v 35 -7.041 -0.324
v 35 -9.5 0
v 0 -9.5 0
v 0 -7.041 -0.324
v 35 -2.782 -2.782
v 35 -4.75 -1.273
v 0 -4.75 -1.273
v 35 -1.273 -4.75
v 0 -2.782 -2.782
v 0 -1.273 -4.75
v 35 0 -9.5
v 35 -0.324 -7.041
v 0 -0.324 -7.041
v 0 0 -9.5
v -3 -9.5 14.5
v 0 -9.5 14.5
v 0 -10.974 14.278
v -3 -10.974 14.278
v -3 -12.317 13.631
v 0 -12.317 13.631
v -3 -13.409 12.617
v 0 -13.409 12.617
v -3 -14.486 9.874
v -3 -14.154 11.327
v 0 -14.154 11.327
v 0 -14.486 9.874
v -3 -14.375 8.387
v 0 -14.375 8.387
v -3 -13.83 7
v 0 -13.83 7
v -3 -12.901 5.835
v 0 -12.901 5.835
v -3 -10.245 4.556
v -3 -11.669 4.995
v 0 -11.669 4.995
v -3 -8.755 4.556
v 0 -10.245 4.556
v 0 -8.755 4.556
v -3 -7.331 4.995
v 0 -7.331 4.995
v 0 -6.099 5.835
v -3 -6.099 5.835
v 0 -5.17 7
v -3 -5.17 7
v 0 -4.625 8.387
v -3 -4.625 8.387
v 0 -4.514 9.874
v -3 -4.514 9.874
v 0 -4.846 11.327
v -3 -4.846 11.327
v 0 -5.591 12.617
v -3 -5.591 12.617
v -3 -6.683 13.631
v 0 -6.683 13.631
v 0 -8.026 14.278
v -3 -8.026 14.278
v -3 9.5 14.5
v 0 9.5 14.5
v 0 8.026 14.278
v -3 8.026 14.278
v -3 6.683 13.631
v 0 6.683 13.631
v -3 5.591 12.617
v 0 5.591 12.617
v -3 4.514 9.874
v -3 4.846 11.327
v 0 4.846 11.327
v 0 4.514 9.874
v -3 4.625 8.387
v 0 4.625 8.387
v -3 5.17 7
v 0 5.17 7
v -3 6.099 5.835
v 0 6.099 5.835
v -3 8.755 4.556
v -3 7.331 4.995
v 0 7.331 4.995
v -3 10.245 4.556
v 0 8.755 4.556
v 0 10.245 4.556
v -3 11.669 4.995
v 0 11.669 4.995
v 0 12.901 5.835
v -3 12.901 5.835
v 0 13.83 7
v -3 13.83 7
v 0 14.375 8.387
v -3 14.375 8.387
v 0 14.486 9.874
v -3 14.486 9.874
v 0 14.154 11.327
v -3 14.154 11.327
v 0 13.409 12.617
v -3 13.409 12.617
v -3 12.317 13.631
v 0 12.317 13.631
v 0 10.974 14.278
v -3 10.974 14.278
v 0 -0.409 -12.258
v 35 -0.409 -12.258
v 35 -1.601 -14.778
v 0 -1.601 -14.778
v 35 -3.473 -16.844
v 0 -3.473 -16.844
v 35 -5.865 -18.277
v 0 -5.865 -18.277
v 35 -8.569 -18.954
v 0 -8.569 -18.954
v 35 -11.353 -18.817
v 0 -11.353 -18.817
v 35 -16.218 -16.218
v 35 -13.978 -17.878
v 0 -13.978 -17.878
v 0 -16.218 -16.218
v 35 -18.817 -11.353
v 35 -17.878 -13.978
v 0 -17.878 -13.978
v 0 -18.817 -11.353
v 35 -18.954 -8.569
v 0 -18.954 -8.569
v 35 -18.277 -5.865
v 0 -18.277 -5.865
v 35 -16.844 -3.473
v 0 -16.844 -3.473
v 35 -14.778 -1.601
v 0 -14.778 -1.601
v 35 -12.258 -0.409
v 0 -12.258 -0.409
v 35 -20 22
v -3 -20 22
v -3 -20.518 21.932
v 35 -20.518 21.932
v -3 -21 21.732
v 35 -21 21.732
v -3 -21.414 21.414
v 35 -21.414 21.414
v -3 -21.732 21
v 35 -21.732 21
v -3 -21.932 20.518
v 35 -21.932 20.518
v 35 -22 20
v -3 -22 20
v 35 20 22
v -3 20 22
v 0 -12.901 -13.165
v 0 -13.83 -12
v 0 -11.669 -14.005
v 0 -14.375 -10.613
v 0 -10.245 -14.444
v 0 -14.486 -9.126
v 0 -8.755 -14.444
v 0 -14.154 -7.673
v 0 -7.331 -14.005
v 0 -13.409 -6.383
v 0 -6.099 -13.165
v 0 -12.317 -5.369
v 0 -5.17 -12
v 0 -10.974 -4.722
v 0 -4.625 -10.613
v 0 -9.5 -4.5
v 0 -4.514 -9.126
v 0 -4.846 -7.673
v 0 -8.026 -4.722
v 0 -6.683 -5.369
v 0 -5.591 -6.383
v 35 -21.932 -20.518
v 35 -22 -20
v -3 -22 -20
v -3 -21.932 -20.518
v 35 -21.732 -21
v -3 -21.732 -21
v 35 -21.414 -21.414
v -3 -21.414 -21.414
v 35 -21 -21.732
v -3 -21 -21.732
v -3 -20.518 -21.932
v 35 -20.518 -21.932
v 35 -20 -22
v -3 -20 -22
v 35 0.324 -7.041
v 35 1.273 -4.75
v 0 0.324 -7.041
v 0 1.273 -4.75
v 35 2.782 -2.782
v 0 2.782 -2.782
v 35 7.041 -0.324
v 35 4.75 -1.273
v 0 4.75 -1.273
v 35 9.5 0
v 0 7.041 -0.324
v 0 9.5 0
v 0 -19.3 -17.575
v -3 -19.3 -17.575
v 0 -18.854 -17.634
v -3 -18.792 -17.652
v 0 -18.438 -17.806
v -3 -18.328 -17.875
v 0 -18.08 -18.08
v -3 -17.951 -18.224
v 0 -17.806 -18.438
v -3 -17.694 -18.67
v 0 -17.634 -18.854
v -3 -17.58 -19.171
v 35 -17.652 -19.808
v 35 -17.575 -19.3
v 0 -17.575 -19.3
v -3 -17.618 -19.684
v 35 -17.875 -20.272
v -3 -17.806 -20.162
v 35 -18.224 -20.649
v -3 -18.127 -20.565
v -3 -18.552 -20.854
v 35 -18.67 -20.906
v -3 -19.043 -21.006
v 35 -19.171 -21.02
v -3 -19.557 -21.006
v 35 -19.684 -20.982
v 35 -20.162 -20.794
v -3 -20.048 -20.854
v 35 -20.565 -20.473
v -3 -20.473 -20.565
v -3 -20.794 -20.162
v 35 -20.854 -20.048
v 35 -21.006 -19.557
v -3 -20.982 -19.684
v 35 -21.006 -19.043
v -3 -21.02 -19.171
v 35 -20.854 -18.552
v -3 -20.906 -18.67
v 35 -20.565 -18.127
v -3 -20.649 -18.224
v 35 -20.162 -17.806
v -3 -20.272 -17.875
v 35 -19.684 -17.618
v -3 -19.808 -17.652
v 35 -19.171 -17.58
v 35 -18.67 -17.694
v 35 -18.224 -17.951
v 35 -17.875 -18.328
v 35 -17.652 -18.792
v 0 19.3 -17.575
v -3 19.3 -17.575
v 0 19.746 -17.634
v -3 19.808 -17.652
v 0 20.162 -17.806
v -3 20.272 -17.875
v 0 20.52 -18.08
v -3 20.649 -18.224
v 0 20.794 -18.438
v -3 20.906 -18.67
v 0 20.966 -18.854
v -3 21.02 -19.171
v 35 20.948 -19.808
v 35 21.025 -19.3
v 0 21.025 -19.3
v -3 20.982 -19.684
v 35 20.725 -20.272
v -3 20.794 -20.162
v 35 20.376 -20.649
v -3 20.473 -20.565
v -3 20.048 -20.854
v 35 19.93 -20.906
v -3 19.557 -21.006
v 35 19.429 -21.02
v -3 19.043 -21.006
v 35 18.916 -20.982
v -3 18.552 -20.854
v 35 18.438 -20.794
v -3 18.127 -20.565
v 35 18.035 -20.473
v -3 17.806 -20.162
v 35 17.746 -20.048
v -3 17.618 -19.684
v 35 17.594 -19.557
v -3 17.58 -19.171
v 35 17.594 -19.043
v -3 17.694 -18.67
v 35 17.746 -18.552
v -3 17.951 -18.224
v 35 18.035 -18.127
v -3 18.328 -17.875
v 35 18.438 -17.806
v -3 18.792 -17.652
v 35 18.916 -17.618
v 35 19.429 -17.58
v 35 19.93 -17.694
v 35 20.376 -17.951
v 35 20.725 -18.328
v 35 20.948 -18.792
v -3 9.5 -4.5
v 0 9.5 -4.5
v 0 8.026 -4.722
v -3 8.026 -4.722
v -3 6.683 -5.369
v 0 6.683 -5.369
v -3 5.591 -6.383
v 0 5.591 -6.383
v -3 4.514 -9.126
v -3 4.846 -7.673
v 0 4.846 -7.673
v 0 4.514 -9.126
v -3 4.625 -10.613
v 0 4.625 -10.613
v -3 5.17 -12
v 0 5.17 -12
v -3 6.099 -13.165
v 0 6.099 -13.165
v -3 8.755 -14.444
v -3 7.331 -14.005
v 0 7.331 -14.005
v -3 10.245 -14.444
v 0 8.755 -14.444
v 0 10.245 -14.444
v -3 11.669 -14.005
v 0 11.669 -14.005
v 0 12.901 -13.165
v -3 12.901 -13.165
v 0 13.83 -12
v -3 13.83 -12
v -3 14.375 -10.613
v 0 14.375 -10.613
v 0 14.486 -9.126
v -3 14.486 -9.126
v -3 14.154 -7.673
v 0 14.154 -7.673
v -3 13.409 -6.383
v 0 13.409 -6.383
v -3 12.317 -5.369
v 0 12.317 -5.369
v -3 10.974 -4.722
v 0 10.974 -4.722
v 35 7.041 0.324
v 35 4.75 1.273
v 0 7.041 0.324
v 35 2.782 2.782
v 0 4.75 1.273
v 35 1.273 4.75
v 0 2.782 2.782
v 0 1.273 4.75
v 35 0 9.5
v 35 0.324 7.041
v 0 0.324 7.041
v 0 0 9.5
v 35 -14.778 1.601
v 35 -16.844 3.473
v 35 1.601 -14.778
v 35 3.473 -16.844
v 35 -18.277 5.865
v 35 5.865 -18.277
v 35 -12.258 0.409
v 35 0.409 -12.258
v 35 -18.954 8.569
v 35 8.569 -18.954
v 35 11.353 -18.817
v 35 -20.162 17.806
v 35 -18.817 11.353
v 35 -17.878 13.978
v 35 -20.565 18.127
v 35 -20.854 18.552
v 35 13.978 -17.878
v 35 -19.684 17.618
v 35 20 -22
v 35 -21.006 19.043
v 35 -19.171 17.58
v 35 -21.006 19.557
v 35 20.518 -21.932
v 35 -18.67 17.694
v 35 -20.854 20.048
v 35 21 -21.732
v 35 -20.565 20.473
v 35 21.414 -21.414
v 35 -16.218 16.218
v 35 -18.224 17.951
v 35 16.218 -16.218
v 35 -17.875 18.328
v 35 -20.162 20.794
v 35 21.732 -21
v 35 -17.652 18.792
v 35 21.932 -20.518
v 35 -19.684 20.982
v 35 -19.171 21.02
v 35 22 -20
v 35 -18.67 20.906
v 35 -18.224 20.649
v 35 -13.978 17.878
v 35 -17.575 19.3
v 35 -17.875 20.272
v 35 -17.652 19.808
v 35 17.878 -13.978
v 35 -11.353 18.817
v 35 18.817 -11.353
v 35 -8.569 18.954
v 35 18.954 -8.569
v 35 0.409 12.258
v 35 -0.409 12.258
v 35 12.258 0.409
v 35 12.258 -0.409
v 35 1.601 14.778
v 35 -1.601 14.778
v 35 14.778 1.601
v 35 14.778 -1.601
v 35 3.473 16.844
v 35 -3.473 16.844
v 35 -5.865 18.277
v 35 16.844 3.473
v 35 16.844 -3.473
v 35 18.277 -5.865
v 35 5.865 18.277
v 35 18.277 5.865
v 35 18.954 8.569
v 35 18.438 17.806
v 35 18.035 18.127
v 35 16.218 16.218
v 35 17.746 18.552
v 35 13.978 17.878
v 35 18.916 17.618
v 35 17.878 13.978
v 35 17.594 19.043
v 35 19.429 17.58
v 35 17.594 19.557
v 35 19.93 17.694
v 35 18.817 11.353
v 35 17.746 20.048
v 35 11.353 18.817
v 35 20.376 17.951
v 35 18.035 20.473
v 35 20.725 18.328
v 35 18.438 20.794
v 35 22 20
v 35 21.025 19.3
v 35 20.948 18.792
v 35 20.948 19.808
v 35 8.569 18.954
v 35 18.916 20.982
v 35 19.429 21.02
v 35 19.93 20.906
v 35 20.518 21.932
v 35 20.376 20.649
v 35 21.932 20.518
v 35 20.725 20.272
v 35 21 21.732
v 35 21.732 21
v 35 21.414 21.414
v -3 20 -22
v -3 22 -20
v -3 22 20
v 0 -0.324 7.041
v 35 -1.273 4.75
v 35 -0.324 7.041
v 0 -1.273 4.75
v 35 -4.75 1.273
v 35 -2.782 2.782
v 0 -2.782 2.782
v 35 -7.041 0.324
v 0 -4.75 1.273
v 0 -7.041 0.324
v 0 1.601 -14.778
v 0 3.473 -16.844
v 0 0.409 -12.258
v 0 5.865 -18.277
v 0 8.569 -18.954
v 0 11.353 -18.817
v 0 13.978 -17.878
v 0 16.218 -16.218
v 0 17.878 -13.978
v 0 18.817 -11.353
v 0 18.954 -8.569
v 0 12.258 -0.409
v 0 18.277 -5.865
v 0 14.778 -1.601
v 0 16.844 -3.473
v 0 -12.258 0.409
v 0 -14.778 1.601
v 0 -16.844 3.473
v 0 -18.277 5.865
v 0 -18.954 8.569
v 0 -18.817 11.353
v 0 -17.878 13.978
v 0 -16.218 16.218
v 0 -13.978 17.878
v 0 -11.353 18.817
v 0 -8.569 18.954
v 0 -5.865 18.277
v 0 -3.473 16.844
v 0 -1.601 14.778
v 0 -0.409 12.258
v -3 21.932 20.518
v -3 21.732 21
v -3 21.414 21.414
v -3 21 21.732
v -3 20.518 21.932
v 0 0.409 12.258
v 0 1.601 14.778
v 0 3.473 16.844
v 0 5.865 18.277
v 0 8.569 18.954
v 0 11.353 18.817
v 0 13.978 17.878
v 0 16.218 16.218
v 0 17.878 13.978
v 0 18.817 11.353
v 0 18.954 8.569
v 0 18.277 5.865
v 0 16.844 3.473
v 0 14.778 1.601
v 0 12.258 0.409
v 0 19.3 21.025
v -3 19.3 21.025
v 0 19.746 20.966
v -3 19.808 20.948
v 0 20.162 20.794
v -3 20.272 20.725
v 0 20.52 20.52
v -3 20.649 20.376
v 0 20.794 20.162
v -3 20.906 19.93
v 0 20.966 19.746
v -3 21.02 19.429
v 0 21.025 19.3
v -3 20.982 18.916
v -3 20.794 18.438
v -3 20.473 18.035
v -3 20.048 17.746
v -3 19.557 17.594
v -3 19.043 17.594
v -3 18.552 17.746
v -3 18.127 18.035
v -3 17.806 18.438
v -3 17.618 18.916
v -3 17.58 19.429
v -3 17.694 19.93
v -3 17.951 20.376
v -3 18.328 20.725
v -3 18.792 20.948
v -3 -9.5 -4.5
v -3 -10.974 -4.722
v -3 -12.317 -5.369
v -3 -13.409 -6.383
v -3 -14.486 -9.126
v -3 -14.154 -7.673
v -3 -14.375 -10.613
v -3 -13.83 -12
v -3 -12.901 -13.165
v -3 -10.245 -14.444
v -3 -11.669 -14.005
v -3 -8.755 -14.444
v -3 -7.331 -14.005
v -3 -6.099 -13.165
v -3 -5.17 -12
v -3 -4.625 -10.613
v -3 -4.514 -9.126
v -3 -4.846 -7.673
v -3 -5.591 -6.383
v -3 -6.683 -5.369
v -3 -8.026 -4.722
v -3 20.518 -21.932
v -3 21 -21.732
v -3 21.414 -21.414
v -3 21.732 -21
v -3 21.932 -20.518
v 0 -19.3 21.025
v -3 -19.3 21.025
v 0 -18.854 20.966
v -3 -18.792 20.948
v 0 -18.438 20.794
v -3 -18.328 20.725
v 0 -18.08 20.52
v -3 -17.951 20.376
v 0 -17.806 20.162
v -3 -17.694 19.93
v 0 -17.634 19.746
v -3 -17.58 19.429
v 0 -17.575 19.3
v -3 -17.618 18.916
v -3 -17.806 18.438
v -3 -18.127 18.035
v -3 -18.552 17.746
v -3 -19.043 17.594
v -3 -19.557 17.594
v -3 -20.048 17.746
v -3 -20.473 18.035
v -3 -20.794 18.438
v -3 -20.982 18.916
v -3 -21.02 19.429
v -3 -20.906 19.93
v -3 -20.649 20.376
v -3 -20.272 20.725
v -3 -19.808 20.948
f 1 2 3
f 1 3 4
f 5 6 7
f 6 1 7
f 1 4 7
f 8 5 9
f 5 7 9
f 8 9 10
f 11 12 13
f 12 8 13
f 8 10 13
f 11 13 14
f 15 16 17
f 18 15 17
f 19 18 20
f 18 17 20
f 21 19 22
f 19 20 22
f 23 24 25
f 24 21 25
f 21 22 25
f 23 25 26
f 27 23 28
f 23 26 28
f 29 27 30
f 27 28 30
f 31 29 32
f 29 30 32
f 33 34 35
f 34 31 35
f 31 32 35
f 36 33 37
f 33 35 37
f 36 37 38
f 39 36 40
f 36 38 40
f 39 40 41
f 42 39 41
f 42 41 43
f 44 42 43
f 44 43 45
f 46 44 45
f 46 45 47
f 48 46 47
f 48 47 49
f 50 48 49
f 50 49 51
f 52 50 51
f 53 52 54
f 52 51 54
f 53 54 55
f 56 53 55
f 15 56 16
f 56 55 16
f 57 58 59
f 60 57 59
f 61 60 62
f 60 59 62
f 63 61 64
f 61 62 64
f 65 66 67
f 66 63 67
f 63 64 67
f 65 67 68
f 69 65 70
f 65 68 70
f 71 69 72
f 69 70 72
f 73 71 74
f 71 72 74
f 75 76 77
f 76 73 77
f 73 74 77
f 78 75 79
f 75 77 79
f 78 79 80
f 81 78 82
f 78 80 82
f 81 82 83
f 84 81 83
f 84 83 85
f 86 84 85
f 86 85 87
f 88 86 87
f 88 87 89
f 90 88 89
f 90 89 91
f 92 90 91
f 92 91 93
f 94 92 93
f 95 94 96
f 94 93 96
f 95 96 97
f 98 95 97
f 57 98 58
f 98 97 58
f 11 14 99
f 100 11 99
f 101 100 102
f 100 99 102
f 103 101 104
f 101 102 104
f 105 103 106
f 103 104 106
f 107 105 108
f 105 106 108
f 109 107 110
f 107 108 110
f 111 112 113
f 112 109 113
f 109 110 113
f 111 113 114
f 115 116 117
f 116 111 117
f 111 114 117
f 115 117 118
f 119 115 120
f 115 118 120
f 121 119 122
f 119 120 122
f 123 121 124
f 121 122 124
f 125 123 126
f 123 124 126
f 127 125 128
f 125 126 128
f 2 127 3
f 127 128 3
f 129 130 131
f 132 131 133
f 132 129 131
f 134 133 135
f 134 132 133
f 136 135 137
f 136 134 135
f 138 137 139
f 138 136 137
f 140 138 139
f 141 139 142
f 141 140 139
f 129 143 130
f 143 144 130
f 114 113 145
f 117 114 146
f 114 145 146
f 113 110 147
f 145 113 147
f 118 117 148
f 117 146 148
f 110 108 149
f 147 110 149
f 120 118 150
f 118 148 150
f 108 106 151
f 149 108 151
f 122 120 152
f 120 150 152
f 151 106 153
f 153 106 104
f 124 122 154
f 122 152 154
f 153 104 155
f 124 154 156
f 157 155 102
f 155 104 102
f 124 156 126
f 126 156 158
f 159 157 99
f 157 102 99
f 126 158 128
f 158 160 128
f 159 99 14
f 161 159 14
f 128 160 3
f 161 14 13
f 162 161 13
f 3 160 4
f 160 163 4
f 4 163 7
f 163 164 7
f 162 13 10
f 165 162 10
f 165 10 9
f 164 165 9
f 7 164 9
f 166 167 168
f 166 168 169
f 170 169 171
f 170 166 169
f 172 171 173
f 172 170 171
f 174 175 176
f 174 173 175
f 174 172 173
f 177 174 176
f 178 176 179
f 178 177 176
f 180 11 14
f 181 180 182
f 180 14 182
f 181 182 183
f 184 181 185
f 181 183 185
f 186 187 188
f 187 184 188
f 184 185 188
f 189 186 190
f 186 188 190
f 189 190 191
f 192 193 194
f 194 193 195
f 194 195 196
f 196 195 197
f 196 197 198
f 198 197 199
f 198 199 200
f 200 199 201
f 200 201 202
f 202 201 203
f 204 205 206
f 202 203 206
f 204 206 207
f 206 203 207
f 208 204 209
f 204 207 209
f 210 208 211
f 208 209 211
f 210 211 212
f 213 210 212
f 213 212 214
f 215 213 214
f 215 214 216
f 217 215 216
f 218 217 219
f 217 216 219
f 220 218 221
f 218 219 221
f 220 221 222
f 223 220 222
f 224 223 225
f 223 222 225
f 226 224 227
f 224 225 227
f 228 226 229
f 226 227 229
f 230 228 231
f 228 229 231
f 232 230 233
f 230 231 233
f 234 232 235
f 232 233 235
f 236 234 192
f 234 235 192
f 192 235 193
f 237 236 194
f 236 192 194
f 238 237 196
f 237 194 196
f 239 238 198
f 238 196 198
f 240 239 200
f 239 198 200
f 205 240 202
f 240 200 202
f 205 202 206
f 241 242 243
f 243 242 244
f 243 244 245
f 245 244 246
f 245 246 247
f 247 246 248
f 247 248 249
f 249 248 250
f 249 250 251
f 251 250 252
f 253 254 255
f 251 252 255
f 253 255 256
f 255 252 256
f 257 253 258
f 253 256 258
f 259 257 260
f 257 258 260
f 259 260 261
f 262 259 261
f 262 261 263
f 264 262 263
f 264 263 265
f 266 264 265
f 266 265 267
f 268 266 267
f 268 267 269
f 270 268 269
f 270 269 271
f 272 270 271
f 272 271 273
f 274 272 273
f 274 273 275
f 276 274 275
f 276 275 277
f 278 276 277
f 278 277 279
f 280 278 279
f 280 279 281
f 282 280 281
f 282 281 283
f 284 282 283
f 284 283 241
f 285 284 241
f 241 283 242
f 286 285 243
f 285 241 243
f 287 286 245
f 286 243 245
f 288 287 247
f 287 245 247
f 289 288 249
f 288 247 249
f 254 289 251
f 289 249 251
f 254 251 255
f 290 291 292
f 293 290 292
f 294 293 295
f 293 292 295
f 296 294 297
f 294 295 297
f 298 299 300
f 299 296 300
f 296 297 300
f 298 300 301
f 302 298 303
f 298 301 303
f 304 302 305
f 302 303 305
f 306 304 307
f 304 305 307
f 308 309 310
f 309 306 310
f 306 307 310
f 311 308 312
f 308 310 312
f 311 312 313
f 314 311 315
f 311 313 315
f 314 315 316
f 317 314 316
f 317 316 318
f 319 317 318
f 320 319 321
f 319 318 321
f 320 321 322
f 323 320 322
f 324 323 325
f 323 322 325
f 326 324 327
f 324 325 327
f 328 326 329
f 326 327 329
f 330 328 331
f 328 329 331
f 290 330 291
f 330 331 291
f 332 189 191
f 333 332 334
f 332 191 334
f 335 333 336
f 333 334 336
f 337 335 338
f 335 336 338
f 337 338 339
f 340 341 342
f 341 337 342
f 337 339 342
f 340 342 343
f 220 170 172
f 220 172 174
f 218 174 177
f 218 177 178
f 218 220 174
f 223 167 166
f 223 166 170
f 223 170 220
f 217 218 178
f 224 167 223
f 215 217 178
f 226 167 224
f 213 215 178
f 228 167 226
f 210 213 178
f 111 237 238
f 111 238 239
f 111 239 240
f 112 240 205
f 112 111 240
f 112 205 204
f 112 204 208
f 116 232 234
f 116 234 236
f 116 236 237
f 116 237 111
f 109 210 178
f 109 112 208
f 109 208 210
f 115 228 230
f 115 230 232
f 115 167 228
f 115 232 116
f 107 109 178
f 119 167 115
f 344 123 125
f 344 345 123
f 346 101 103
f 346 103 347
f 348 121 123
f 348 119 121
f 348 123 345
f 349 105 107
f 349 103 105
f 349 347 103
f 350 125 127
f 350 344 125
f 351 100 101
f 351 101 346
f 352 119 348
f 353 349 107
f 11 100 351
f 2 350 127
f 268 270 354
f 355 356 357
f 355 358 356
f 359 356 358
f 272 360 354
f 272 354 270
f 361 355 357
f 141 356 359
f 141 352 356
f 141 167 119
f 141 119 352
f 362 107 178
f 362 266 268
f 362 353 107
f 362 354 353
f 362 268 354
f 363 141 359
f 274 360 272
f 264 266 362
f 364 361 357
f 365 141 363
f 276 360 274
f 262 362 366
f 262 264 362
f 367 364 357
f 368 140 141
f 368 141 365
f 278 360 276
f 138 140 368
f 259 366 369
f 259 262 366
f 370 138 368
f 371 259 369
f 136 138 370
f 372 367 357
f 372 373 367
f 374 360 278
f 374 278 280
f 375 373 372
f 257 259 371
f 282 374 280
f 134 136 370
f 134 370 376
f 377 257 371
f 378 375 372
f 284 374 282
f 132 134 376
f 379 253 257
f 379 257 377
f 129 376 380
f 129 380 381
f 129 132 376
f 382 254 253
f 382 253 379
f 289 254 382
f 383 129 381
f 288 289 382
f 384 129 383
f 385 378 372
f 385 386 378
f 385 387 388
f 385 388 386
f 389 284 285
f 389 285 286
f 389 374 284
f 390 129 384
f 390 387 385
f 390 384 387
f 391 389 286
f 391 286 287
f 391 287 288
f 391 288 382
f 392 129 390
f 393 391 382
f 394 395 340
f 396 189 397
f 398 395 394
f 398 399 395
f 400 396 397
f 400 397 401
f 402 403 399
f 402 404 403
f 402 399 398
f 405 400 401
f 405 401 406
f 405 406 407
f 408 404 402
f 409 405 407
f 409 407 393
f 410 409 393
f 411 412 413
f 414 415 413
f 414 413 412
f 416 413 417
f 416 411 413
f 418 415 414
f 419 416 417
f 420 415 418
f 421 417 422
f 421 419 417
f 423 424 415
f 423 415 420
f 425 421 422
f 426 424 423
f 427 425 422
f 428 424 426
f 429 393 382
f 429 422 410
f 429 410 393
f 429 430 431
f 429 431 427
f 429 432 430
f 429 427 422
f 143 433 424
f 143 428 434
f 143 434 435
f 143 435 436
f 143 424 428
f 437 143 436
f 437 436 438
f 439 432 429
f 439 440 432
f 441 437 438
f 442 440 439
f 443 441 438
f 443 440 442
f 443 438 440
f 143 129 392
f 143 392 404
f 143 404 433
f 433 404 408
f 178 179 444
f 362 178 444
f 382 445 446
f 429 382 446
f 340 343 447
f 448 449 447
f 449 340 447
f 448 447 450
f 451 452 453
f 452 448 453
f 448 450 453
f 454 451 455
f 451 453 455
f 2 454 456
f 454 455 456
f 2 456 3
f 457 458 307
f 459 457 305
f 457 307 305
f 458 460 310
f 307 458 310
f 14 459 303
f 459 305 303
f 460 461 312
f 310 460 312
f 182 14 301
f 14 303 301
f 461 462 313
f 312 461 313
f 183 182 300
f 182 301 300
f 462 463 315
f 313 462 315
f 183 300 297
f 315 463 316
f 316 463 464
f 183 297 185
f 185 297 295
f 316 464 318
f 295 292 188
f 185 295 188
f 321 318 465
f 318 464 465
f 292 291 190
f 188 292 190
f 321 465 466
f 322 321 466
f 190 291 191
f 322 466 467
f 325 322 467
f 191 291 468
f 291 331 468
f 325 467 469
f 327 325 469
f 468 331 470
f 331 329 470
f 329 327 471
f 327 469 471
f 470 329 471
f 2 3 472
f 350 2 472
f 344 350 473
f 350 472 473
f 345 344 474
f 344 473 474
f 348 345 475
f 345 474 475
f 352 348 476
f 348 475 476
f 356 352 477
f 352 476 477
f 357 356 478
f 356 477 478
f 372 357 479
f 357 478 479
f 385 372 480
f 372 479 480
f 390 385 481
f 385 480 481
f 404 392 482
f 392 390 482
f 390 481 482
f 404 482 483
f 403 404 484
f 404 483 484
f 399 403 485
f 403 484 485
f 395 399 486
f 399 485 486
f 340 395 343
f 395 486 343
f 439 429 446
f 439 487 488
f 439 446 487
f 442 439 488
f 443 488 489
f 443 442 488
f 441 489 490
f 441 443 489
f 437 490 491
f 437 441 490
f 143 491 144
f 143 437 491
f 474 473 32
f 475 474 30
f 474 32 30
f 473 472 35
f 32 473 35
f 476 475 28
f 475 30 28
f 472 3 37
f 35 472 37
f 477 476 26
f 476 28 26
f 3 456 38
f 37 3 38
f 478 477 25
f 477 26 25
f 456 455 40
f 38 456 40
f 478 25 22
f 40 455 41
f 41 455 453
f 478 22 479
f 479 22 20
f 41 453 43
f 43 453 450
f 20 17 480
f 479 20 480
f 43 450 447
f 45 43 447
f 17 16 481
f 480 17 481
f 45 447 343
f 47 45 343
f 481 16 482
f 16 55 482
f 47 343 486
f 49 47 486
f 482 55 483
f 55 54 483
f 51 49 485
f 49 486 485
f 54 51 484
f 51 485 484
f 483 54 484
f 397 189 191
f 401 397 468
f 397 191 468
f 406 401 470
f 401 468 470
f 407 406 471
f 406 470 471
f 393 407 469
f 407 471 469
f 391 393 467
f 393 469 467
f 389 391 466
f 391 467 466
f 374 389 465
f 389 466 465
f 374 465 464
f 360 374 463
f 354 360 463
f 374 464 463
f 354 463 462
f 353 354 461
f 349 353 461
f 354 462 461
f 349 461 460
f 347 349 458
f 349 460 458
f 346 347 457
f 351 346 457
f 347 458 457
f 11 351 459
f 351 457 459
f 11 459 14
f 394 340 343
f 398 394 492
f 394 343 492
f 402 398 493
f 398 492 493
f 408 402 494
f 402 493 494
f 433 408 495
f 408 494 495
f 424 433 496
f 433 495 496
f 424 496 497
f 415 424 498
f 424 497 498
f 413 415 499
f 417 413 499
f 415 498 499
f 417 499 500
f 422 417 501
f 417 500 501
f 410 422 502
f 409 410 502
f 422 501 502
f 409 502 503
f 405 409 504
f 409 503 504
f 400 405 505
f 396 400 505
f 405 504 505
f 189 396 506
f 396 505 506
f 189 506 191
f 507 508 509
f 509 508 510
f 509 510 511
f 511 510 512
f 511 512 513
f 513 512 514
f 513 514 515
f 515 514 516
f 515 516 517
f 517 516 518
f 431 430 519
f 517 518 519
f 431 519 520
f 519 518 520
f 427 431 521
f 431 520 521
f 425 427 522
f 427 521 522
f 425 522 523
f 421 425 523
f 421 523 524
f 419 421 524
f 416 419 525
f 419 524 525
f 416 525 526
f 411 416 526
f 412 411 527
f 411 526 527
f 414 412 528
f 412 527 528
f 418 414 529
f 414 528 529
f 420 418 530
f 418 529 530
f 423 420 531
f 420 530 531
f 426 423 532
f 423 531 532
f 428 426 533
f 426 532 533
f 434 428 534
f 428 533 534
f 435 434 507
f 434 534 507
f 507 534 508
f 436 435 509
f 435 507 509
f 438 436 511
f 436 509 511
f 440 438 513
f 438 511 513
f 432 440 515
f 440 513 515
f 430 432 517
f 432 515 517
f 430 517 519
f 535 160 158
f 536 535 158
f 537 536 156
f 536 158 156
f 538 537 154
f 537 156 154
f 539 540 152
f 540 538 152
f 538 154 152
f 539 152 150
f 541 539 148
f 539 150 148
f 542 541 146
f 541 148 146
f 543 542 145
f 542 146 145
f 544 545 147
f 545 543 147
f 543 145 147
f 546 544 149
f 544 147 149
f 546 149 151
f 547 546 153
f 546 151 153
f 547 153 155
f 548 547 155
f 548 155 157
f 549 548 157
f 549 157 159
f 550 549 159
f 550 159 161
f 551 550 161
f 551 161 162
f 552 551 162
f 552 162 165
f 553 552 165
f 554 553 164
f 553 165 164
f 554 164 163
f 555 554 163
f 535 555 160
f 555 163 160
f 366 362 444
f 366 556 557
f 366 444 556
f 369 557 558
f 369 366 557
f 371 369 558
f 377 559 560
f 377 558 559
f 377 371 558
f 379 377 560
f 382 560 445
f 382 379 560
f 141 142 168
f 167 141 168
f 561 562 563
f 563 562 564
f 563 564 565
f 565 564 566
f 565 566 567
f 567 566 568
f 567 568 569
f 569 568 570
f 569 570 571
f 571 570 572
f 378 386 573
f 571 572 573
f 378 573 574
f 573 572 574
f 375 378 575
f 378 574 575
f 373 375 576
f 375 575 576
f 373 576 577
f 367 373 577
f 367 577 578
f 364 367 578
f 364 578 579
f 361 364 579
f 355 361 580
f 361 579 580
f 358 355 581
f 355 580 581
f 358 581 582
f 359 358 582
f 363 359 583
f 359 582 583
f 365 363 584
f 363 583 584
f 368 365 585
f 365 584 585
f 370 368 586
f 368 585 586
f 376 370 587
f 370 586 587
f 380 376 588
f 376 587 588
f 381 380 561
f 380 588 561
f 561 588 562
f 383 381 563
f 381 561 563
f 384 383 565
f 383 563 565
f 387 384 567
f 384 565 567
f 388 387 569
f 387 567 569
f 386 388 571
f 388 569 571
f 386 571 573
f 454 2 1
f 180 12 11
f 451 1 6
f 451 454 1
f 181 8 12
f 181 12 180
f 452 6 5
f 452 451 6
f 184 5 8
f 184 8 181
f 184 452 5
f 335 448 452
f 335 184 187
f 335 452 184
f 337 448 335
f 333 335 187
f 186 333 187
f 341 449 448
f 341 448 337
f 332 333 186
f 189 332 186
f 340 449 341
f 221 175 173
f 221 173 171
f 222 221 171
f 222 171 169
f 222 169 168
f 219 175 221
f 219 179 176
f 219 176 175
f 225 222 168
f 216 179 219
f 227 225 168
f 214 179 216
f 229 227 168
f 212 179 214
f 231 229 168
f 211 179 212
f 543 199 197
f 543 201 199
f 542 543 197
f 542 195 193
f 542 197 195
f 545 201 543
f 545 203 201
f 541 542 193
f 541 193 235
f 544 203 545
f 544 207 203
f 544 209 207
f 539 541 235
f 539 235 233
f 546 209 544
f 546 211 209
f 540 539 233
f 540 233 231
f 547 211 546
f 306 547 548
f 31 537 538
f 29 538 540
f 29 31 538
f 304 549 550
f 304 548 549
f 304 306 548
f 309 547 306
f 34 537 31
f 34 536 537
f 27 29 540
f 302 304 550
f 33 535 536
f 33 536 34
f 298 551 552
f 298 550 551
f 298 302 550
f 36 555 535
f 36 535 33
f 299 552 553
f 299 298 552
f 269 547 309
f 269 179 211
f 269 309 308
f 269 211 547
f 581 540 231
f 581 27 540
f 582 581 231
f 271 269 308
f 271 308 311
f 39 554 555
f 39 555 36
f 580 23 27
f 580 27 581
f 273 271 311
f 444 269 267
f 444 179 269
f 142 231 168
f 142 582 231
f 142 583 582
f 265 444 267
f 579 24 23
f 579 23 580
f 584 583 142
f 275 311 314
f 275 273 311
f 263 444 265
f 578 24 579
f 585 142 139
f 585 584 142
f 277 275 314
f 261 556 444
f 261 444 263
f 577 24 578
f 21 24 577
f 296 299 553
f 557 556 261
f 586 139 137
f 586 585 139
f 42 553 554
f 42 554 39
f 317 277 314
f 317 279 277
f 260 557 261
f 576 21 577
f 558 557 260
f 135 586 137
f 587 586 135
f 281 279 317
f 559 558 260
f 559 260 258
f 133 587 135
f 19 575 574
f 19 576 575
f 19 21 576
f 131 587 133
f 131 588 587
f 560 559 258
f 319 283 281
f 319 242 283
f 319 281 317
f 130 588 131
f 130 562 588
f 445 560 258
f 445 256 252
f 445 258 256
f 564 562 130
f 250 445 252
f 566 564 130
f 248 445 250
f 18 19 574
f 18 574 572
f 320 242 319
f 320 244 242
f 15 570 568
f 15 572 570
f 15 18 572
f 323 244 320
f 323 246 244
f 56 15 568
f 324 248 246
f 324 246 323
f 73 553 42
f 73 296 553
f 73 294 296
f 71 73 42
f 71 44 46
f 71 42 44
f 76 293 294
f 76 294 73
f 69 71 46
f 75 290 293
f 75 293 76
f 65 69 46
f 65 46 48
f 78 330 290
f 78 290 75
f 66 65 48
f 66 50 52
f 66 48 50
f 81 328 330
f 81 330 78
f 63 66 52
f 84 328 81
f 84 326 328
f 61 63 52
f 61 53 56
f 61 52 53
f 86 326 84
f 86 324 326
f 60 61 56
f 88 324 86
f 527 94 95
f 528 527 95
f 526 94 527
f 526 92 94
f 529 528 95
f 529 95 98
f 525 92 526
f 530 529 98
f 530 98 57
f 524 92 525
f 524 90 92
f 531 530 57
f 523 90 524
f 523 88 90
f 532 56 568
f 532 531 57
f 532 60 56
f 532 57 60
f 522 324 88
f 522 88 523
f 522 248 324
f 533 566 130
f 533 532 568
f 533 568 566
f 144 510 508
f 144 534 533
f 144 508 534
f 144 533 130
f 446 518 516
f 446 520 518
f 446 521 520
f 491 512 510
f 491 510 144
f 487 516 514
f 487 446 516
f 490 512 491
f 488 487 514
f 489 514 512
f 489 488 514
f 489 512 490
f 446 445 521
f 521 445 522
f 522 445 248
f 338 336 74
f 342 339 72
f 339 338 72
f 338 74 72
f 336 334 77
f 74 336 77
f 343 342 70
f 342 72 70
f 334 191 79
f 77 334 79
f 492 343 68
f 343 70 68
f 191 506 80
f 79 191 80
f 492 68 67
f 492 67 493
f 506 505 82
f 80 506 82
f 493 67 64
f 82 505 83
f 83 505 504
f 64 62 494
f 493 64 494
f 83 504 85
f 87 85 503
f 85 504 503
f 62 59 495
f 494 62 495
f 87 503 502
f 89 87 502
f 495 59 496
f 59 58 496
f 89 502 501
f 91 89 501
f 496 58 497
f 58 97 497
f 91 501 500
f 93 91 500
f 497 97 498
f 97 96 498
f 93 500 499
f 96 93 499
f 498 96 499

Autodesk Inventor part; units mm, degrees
ref_plane "YZ Plane" through (0, 0, 0) normal (1, 0, 0) x (0, 1, 0)
ref_plane "XZ Plane" through (0, 0, 0) normal (0, 1, 0) x (-1, 0, 0)
ref_plane "XY Plane" through (0, 0, 0) normal (0, 0, 1) x (1, 0, 0)
sketch "Sketch1" plane through (0, 0, 0) normal (1, 0, 0) x (0, 1, 0)
  line L0 (-22, -22) -> (22, -22)
  line L1 (22, -22) -> (22, 22)
  line L2 (22, 22) -> (-22, 22)
  line L3 (-22, 22) -> (-22, -22)
  line L4 (-22, -22) -> (22, 22) construction
  line L5 (22, -22) -> (-22, 22) construction
  line L6 (-19.3, -19.3) -> (19.3, -19.3)
  line L7 (19.3, -19.3) -> (19.3, 19.3)
  line L8 (19.3, 19.3) -> (-19.3, 19.3)
  line L9 (-19.3, 19.3) -> (-19.3, -19.3)
  line L10 (-19.3, -19.3) -> (19.3, 19.3) construction
  line L11 (19.3, -19.3) -> (-19.3, 19.3) construction
  circle A0 centre (19.3, 19.3) radius 1.725
  circle A1 centre (19.3, -19.3) radius 1.725
  circle A2 centre (-19.3, -19.3) radius 1.725
  circle A3 centre (-19.3, 19.3) radius 1.725
  circle A4 centre (9.5, 9.5) radius 9.5
  circle A5 centre (9.5, -9.5) radius 9.5
  circle A6 centre (-9.5, -9.5) radius 9.5
  circle A7 centre (-9.5, 9.5) radius 9.5
  point P0 (0, 0)
  point P1 (0, 0)
  point P2 (0, 0)
  point P3 (-9.5, 0)
  point P4 (0, 9.5)
  point P5 (9.5, 0)
  point P6 (0, -9.5)
  dimension "d4" = 44
  dimension "d5" = 44
  dimension "d6" = 38.6
  dimension "d7" = 3.45
  dimension "d8" = 3.45
  dimension "d9" = 3.45
  dimension "d10" = 3.45
  dimension "d24" = 19
  dimension "d25" = 19
  dimension "d26" = 19
  dimension "d27" = 19
extrude "Extrusion1" add sketch "Sketch1" along normal blind 35 contours L3 L2 L1 L0 | A2 L9 A3 L8 A0 L7 A1 L6 | A4 A5 A6 A7
fillet "Fillet1" radius 2 4 edges at (17.5, -22, 22) (17.5, -22, -22) (17.5, 22, 22) (17.5, 22, -22)
sketch "Sketch3" plane through (0, 0, 0) normal (-1, 0, 0) x (0, 0, 1)
  circle A0 centre (19.3, 19.3) radius 1.725 projected
  arc A1 (0, -9.5) -> (9.5, 0) centre (9.5, -9.5) ccw projected
  arc A2 (-9.5, 0) -> (0, -9.5) centre (-9.5, -9.5) ccw projected
  arc A3 (0, 9.5) -> (-9.5, 0) centre (-9.5, 9.5) ccw projected
  arc A4 (9.5, 0) -> (0, 9.5) centre (9.5, 9.5) ccw projected
  circle A5 centre (-19.3, 19.3) radius 1.725 projected
  circle A6 centre (-19.3, -19.3) radius 1.725 projected
  circle A7 centre (19.3, -19.3) radius 1.725 projected
  arc A8 (22, 20) -> (20, 22) centre (20, 20) ccw projected
  line L0 (-20, 22) -> (20, 22) projected
  line L1 (-22, -20) -> (-22, 20) projected
  arc A9 (-22, -20) -> (-20, -22) centre (-20, -20) ccw projected
  line L2 (20, -22) -> (-20, -22) projected
  arc A10 (20, -22) -> (22, -20) centre (20, -20) ccw projected
  line L3 (22, 20) -> (22, -20) projected
  circle A11 centre (9.5, -9.5) radius 5
  circle A12 centre (-9.5, -9.5) radius 5
  circle A13 centre (-9.5, 9.5) radius 5
  circle A14 centre (9.5, 9.5) radius 5
  arc A15 (-20, 22) -> (-22, 20) centre (-20, 20) ccw projected
  point P0 (0, 0)
  dimension "d28" = 10
  dimension "d29" = 10
  dimension "d30" = 10
  dimension "d31" = 10
extrude "Extrusion3" add sketch "Sketch3" along normal blind 3 contours A2 A3 A4 A1 | L3 A10 L2 A9 L1 A15 L0 A8
properties part number "BatteryHolder" material "ABS Plastic"
